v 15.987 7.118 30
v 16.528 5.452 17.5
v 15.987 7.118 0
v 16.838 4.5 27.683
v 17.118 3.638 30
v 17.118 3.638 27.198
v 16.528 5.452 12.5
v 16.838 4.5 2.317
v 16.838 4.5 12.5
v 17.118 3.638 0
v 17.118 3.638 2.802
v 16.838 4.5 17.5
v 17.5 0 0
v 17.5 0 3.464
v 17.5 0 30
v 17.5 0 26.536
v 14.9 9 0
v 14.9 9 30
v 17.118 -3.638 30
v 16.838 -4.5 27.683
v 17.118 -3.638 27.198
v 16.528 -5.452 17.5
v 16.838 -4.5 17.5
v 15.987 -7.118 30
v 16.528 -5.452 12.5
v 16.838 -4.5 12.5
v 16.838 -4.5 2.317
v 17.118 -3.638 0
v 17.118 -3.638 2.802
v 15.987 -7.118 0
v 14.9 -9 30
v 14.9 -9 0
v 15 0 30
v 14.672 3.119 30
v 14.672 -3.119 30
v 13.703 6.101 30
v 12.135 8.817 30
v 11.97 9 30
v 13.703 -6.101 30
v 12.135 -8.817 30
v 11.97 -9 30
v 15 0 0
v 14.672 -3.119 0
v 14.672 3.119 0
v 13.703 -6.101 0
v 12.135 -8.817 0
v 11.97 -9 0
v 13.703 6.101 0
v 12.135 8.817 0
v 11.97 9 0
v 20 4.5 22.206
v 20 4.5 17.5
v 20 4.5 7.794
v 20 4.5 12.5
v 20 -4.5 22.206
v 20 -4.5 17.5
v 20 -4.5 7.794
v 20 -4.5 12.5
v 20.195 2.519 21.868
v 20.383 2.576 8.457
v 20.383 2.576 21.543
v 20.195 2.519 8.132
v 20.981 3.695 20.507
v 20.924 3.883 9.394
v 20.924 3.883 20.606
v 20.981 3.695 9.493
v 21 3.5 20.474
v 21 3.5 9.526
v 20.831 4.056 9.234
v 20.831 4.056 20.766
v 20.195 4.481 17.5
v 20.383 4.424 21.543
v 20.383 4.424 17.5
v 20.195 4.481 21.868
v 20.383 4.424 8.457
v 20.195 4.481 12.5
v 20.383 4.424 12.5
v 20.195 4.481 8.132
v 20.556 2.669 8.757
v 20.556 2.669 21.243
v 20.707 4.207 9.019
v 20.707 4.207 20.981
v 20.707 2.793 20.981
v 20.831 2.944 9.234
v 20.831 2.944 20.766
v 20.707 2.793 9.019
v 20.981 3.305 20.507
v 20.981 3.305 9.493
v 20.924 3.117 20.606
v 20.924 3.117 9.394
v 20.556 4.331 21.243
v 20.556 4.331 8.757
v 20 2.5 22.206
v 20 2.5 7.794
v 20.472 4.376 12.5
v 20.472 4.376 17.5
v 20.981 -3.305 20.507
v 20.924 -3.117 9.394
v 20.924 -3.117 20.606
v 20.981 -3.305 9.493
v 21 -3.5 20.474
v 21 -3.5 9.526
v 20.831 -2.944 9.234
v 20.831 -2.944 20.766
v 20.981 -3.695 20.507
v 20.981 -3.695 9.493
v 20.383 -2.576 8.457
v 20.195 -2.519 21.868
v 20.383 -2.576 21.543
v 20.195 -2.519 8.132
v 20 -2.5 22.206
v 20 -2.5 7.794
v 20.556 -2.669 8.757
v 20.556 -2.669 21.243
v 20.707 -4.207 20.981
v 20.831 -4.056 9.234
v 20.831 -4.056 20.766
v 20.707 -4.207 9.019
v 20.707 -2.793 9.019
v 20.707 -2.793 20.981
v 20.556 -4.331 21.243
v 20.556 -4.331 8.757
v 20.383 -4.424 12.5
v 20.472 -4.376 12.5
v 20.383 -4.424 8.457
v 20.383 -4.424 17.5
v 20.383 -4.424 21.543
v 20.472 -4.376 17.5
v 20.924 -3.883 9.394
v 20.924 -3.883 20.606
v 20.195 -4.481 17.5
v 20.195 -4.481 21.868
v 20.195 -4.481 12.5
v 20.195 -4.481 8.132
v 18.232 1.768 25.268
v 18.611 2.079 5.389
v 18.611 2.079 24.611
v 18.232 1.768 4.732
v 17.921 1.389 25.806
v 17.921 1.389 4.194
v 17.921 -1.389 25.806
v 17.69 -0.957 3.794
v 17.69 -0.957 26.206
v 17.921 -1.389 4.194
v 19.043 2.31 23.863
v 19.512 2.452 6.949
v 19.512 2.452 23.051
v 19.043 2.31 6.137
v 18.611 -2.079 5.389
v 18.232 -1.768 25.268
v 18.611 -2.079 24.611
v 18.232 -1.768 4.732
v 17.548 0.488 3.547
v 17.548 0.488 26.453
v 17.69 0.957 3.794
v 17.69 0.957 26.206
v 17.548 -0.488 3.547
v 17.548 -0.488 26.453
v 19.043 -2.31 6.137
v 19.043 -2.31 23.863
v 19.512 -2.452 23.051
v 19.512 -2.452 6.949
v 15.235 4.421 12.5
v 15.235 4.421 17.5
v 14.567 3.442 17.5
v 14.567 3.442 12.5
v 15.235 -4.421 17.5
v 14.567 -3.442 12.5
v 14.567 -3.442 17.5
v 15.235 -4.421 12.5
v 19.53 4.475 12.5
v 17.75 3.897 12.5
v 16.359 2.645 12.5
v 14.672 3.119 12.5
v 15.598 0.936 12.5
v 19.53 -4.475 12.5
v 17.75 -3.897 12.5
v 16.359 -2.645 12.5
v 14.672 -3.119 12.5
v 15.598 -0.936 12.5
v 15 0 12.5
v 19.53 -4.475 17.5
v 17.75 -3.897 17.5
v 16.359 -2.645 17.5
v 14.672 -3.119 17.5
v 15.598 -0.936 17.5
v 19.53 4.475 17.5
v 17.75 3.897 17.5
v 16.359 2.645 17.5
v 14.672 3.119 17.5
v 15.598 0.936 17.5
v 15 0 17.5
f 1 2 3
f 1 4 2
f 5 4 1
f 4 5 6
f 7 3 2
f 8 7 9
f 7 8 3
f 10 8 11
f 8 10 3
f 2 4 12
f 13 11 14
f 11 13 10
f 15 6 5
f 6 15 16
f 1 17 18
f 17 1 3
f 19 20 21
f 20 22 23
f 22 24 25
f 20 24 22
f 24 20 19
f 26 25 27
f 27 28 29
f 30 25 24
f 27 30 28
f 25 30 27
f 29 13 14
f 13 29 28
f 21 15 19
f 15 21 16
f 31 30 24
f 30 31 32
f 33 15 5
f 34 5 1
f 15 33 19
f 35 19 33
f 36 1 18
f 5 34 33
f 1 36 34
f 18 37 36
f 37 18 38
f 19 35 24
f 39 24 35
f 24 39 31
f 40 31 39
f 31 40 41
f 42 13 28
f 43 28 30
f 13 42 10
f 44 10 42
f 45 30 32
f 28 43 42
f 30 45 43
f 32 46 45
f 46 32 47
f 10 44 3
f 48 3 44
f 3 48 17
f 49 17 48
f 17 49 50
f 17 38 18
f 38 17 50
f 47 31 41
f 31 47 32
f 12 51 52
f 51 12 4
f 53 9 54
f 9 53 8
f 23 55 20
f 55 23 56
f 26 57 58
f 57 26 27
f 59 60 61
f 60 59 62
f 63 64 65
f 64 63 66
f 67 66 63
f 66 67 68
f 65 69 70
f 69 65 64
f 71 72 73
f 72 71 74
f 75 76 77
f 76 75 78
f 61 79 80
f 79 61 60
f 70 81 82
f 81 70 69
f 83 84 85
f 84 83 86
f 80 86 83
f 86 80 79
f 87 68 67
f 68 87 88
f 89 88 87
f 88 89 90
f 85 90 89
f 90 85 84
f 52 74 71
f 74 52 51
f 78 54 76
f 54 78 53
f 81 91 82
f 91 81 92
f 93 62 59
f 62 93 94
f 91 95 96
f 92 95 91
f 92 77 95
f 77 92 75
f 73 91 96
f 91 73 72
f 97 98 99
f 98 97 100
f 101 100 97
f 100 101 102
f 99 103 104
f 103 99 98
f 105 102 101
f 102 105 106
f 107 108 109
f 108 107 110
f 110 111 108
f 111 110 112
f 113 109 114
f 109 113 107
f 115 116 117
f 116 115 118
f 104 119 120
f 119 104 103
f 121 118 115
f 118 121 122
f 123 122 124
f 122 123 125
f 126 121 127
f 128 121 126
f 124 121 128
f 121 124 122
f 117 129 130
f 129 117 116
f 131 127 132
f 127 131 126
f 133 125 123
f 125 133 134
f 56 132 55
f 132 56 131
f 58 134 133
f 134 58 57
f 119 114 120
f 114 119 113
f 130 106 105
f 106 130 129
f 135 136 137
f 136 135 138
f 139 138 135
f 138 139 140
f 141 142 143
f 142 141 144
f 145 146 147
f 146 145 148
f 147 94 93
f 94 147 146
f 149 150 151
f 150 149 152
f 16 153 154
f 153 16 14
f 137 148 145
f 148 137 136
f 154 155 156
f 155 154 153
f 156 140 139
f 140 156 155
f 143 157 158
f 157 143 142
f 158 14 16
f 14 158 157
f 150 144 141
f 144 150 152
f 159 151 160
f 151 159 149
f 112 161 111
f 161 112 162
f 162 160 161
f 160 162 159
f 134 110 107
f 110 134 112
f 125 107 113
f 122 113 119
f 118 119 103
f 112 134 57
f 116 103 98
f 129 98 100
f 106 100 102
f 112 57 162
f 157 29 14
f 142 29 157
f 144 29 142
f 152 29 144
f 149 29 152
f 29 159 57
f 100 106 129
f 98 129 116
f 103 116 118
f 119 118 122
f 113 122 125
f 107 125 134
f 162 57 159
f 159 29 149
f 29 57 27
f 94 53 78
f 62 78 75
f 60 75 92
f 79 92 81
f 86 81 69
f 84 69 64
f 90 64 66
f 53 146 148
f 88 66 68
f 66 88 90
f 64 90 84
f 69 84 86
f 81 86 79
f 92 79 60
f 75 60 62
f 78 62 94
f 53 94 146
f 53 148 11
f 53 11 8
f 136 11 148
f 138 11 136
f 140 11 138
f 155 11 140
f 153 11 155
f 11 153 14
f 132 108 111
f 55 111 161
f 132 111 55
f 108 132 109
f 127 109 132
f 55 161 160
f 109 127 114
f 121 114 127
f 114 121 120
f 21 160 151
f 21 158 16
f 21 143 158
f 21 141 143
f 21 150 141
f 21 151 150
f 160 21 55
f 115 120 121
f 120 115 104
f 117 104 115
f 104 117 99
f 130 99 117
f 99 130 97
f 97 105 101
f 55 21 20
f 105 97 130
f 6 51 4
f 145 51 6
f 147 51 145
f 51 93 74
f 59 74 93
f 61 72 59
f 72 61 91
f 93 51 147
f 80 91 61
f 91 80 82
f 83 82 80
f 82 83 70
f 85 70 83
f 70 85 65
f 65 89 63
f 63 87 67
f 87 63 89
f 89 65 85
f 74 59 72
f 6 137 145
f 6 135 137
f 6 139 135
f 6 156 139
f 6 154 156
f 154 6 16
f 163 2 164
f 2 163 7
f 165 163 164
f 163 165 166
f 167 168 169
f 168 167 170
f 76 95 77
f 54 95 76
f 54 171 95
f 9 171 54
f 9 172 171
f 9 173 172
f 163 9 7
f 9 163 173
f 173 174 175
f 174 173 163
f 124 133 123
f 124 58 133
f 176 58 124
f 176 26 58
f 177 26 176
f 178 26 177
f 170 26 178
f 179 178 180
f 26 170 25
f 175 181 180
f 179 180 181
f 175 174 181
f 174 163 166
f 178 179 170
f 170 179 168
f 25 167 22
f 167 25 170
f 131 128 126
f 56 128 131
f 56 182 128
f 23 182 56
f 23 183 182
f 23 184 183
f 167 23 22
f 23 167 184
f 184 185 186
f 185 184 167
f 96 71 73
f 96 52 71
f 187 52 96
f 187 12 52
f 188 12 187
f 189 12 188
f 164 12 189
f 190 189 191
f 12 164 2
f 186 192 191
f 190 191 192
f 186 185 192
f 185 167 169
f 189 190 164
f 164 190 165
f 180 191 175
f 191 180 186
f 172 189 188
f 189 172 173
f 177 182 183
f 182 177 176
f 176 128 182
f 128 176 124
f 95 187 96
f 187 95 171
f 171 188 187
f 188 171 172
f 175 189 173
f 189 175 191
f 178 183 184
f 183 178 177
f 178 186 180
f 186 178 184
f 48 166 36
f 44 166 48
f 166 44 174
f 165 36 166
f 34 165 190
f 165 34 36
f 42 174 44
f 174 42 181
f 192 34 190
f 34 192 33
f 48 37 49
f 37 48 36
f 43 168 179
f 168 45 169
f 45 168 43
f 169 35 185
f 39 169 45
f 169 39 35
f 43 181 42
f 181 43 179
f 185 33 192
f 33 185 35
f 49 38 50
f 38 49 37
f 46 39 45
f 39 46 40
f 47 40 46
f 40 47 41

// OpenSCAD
tube_diam = 30;
wall_width = 2.5;

cabled = 5; //cable diameter
cabler = cabled /2;
cableww = 2; //cable wall width
cangle = 30;

length = 30;


//cable ties
tiew = 5;
tieh = 2;

loopd = cabled + cableww *2;


//maths
clampw = cabled+cableww*2;
tube_circum = 3.13159 * tube_diam;
// double clamp width
angle = 360 * clampw * 2 / tube_circum;

bracingr = tube_diam / 2 + wall_width;


module tubebody(){
	intersection() {
		cylinder(h = length, r = bracingr);
		translate([0,-clampw, 0])cube([bracingr, clampw *2, length]);	
	}
	
	
}

//body no cutouts
module clamp_body_1() {
	$fn=32;
	translate([-cabler-cableww, -cabler - cableww,0])
		cube([cabler + cableww,cabled + cableww*2,length/2]);
	translate([0,cabler +cableww/2 , 0])
		cylinder(h = length/2, r = cableww/2);
	translate([0,-cabler- cableww/2 , 0])
		cylinder(h = length/2, r = cableww/2);
}

//cut out cable and slope
module clamp_body_2() {
	$fn=32;
	//cable
	difference(){
		clamp_body_1();
		cylinder(h= length, r = cabler);
		//slope
		translate([-cabler-cableww,0,0])
			rotate([0,cangle,0])
				translate([0,-cabled*3,0])
					cube([cabled*6,cabled*6,length]);
	}
	
}

//mirror for both sides
module clamp_body_3() {
	translate([0,0 ,length ])
	mirror([0, 0, 1])
	clamp_body_2();
	clamp_body_2();
}


module body_all(){
	tubebody();
	translate([bracingr  + wall_width,0 , 0])
		clamp_body_3();	
}

module body_final() {
	difference() {
		body_all();	
		cylinder(h = length, r = tube_diam/2 );

		//cable ties
		#translate([bracingr  + wall_width,0,length /2-tiew/2])cabletie();
	}
	
}

module cabletie() {
	difference() {
		cylinder(h = tiew, r = loopd/2 + tieh);
		cylinder(h = tiew, r = loopd/2 );	
	}
	
}

body_final();
//cabletie();
//clamp_body_2();
